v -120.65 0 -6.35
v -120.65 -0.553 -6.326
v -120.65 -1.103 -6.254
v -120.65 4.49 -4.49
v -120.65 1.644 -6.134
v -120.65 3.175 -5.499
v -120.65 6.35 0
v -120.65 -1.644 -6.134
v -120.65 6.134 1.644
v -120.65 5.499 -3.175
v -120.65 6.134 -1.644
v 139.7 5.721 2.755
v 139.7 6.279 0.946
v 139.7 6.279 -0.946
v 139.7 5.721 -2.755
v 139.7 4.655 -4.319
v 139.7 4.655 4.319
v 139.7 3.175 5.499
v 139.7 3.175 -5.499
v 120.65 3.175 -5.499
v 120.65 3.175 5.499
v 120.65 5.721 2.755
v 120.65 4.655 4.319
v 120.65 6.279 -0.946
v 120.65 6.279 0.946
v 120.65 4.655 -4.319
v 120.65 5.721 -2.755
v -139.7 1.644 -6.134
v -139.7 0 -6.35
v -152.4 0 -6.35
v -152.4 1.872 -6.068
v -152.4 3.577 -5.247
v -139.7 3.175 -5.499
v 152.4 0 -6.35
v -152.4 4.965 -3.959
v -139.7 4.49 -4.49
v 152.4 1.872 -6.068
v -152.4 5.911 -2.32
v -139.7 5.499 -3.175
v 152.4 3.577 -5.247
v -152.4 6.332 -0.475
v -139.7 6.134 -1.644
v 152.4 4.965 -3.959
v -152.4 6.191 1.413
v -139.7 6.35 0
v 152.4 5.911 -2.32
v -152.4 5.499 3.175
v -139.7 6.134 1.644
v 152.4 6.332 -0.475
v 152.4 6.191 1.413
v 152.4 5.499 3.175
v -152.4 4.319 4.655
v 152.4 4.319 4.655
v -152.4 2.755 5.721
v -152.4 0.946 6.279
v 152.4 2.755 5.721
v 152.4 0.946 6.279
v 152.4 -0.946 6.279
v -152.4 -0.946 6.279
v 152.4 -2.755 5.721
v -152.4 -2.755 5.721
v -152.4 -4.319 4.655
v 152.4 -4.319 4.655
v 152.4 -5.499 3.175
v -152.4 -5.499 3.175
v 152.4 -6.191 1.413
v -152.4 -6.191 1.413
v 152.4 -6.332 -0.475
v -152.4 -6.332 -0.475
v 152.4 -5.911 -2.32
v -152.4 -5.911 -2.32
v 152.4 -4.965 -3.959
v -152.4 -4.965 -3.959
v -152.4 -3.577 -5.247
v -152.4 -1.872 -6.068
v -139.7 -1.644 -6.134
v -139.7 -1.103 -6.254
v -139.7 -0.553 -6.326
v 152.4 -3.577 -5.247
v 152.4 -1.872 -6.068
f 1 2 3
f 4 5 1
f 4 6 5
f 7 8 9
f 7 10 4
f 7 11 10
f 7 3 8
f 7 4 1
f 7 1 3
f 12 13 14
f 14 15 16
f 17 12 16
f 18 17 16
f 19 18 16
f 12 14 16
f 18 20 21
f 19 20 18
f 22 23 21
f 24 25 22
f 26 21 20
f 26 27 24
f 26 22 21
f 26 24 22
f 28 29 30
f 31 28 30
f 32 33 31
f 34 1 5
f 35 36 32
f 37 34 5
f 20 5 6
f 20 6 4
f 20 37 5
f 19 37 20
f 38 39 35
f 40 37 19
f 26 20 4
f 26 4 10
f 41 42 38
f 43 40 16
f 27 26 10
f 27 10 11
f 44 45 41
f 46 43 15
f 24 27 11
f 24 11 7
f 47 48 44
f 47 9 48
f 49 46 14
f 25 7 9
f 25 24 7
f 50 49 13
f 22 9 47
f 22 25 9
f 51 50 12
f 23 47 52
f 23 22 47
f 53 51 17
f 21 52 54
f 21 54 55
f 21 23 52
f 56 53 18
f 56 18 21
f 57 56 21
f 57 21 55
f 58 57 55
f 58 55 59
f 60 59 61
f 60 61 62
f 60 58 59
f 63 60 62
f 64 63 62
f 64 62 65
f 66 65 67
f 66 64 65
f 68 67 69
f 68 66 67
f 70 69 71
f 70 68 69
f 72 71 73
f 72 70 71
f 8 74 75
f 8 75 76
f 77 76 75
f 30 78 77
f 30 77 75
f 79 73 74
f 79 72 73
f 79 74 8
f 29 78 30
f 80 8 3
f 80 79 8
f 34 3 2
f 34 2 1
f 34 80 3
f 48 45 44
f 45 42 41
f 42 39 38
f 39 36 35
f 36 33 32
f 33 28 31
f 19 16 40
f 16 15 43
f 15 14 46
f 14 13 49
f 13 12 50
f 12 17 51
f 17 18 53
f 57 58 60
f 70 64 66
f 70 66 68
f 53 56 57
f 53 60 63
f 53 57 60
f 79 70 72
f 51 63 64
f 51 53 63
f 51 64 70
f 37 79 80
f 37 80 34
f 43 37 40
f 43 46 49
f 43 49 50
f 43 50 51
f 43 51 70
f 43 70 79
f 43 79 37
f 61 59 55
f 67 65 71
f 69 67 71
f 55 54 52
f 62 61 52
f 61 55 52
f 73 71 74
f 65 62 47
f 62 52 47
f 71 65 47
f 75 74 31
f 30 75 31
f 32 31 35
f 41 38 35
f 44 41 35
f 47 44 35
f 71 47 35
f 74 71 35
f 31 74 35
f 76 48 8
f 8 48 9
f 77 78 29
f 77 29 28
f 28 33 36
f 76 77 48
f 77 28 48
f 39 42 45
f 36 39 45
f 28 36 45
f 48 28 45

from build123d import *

# Parameters (mm, degrees)
SKETCH1_R           = 6.35
BOSS_EXTRUDE1_DEPTH = 152.4
SKETCH3_W           = 19.05
SKETCH3_H           = 12.7
CUT_EXTRUDE1_DEPTH  = 3.175
SKETCH4_W           = 19.05
SKETCH4_H           = 12.7
CUT_EXTRUDE2_DEPTH  = 3.175


with BuildPart() as part:
    # Sketch1 → Boss-Extrude1 (new body, symmetric)
    with BuildSketch(Plane(origin=(0, 0, 0), x_dir=(0, 0, -1), z_dir=(1, 0, 0))):
        Circle(SKETCH1_R)
    extrude(amount=BOSS_EXTRUDE1_DEPTH, both=True)

    # Sketch3 → Cut-Extrude1 (cut)
    with BuildSketch(Plane(origin=(0, 6.35, 0), x_dir=(1, 0, 0), z_dir=(0, 1, 0))):
        with Locations((130.175, 0)):
            Rectangle(SKETCH3_W, SKETCH3_H)
    extrude(amount=-CUT_EXTRUDE1_DEPTH, mode=Mode.SUBTRACT)

    # Sketch4 → Cut-Extrude2 (cut)
    with BuildSketch(Plane(origin=(0, 4.490128061, -4.490128061), x_dir=(1, 0, 0), z_dir=(0, -0.707106781, 0.707106781))):
        with Locations((-130.175, 0)):
            Rectangle(SKETCH4_W, SKETCH4_H)
    extrude(amount=CUT_EXTRUDE2_DEPTH, mode=Mode.SUBTRACT)


solid = part.part
